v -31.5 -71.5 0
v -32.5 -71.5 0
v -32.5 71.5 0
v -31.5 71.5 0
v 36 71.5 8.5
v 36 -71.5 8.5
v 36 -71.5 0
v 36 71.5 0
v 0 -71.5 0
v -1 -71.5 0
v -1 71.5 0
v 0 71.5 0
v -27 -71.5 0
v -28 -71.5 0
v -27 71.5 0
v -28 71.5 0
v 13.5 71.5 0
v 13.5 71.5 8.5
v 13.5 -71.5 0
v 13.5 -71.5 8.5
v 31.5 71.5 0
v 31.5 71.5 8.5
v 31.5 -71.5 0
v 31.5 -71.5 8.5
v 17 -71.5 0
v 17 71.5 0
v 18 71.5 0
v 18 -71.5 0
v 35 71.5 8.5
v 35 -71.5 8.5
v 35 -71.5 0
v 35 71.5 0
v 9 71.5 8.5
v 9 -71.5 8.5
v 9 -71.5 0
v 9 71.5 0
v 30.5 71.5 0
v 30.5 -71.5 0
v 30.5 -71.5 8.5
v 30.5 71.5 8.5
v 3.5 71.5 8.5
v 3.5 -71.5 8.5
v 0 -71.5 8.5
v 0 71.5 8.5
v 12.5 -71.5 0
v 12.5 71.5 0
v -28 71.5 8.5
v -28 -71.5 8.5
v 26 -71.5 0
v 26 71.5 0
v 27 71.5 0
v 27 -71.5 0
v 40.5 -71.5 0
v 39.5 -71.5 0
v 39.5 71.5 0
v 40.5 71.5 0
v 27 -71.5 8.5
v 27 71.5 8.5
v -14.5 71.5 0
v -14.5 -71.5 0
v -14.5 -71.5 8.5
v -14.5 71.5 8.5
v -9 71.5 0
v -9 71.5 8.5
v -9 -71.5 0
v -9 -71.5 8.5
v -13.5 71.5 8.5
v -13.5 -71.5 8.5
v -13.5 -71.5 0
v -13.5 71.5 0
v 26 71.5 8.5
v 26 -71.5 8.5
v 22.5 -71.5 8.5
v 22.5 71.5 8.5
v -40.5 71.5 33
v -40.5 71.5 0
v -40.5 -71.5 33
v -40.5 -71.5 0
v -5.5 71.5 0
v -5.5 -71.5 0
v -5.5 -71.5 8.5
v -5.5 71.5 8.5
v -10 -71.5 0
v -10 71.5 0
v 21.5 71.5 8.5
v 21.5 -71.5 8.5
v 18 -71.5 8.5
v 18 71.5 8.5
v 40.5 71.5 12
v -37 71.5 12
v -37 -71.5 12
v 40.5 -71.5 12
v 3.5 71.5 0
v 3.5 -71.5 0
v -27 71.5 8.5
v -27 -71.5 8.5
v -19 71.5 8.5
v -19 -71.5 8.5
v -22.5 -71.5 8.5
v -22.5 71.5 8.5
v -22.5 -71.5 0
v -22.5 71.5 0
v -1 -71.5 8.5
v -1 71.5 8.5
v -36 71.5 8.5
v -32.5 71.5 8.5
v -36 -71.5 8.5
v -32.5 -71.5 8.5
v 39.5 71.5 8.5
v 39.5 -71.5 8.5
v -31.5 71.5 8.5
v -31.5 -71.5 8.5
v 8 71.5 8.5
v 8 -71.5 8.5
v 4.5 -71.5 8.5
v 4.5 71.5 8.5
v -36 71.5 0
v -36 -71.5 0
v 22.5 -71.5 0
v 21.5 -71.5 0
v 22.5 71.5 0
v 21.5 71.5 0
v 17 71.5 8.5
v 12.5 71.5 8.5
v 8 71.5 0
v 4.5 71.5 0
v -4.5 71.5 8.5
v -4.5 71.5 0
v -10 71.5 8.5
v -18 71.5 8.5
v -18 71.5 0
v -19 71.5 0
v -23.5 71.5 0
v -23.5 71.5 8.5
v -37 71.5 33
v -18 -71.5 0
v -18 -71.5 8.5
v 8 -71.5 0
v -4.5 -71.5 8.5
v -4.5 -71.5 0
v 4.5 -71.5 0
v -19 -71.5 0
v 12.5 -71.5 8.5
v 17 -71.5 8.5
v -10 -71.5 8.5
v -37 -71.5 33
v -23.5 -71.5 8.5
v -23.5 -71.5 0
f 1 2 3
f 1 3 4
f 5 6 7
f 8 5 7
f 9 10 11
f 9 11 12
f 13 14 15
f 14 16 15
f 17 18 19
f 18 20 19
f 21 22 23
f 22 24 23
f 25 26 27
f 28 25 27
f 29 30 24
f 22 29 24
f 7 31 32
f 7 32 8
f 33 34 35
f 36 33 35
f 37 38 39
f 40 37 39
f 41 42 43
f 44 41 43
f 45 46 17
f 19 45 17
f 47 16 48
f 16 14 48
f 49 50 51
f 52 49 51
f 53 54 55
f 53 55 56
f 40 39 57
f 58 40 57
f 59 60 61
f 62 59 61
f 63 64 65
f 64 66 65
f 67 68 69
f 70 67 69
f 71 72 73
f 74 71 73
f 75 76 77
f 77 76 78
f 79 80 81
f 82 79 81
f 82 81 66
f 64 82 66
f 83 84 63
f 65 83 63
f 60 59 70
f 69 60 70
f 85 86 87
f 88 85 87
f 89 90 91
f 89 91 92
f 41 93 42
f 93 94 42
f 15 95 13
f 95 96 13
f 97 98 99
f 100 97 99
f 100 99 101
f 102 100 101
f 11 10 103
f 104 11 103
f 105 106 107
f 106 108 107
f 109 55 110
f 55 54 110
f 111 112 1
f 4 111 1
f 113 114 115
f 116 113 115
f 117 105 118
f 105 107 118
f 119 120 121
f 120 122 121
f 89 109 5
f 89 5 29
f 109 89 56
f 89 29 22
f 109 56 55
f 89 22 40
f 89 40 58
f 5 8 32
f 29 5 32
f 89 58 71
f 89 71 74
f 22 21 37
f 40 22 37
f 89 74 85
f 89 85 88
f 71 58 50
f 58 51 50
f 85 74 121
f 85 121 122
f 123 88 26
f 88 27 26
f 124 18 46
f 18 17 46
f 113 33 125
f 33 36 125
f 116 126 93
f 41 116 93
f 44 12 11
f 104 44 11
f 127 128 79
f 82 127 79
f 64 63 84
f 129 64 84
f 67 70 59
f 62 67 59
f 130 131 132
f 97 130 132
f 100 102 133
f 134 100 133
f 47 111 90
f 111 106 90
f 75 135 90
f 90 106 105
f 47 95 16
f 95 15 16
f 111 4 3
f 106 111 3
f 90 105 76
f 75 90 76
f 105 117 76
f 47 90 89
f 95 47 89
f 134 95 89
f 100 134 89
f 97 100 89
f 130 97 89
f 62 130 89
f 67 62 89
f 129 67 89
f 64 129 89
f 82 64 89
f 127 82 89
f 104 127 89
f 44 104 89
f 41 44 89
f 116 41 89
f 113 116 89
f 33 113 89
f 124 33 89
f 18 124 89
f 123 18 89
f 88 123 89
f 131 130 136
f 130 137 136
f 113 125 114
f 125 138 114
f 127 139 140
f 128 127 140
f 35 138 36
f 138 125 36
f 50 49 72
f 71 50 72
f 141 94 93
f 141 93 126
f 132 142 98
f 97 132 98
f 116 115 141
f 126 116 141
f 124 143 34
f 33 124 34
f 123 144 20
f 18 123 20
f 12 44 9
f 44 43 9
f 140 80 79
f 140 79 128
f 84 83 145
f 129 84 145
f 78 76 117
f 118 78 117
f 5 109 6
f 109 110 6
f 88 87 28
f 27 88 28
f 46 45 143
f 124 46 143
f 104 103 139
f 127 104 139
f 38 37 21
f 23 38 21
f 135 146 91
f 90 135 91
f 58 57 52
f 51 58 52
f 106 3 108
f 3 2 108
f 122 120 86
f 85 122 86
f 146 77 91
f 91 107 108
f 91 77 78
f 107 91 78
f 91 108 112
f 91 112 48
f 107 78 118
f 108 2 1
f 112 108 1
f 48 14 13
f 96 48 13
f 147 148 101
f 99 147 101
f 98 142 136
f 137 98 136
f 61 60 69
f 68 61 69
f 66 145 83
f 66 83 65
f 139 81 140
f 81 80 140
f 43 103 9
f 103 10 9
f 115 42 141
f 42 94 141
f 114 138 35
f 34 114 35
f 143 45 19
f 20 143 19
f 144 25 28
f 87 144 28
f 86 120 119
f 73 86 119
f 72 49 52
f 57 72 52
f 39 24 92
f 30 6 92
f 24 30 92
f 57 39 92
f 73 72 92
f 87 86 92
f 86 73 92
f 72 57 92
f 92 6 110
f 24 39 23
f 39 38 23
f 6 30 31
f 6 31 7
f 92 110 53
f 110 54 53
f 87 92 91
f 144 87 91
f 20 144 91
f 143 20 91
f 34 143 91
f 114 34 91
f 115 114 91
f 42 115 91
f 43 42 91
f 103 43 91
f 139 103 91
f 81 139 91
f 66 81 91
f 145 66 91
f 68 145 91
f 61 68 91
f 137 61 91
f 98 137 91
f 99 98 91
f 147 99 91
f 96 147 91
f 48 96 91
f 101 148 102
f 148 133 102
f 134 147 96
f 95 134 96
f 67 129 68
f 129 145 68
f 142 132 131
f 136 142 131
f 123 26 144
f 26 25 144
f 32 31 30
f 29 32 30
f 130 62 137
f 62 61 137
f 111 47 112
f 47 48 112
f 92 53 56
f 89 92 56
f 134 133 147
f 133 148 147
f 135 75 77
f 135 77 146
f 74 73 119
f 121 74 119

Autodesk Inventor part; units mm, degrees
ref_plane "YZ Plane" through (0, 0, 0) normal (1, 0, 0) x (0, 1, 0)
ref_plane "XZ Plane" through (0, 0, 0) normal (0, 1, 0) x (-1, 0, 0)
ref_plane "XY Plane" through (0, 0, 0) normal (0, 0, 1) x (1, 0, 0)
sketch "Skizze1" plane through (0, 0, 0) normal (0, 0, 1) x (1, 0, 0)
  line L0 (-40.5, -71.5) -> (40.5, -71.5)
  line L1 (40.5, -71.5) -> (40.5, 71.5)
  line L2 (40.5, 71.5) -> (-40.5, 71.5)
  line L3 (-40.5, 71.5) -> (-40.5, -71.5)
  line L4 (-40.5, -71.5) -> (40.5, 71.5) construction
  line L5 (40.5, -71.5) -> (-40.5, 71.5) construction
  point P0 (0, 0)
  dimension "d0" = 143
  dimension "d1" = 81
extrude "Grundkörper" add sketch "Skizze1" along normal blind 33
sketch "Skizze2" plane through (-40.5, -71.5, 0) normal (0, -1, 0) x (1, 0, 0)
  line L0 (0, 0) -> (0, 33) projected
  line L1 (0, 0) -> (81, 0) projected
  line L2 (0, 0) -> (81, 0) projected
  line L3 (81, 0) -> (81, 33) projected
  line L4 (0, 33) -> (81, 33) projected
  line L5 (0, 0) -> (0, 33) projected
  line L6 (81, 0) -> (81, 33) projected
  line L7 (3.5, 33) -> (3.5, 12)
  line L8 (3.5, 12) -> (81, 12)
  point P0 (40.5, 0)
  dimension "d4" = 12
  dimension "d5" = 3.5
extrude "Ausschnitt" cut sketch "Skizze2" against normal through all contours L4 L3 L8 L7
sketch "Skizze3" plane through (-40.5, -71.5, 0) normal (0, -1, 0) x (1, 0, 0)
  line L0 (0, 0) -> (81, 0) construction
  line L1 (81, 0) -> (81, 12) construction
  line L2 (81, 0) -> (0, 0) construction
  line L3 (76.5, 0) -> (80, 0)
  line L4 (80, 0) -> (80, 8.5)
  line L5 (80, 8.5) -> (76.5, 8.5)
  line L6 (76.5, 8.5) -> (76.5, 0)
  line L7 (72, 8.5) -> (72, 0)
  line L8 (72, 0) -> (75.5, 0)
  line L9 (75.5, 0) -> (75.5, 8.5)
  line L10 (75.5, 8.5) -> (72, 8.5)
  line L11 (67.5, 8.5) -> (67.5, 0)
  line L12 (67.5, 0) -> (71, 0)
  line L13 (71, 0) -> (71, 8.5)
  line L14 (71, 8.5) -> (67.5, 8.5)
  line L15 (63, 8.5) -> (63, 0)
  line L16 (63, 0) -> (66.5, 0)
  line L17 (66.5, 0) -> (66.5, 8.5)
  line L18 (66.5, 8.5) -> (63, 8.5)
  line L19 (58.5, 8.5) -> (58.5, 0)
  line L20 (58.5, 0) -> (62, 0)
  line L21 (62, 0) -> (62, 8.5)
  line L22 (62, 8.5) -> (58.5, 8.5)
  line L23 (54, 8.5) -> (54, 0)
  line L24 (54, 0) -> (57.5, 0)
  line L25 (57.5, 0) -> (57.5, 8.5)
  line L26 (57.5, 8.5) -> (54, 8.5)
  line L27 (49.5, 8.5) -> (49.5, 0)
  line L28 (49.5, 0) -> (53, 0)
  line L29 (53, 0) -> (53, 8.5)
  line L30 (53, 8.5) -> (49.5, 8.5)
  line L31 (45, 8.5) -> (45, 0)
  line L32 (45, 0) -> (48.5, 0)
  line L33 (48.5, 0) -> (48.5, 8.5)
  line L34 (48.5, 8.5) -> (45, 8.5)
  line L35 (40.5, 8.5) -> (40.5, 0)
  line L36 (40.5, 0) -> (44, 0)
  line L37 (44, 0) -> (44, 8.5)
  line L38 (44, 8.5) -> (40.5, 8.5)
  line L39 (36, 8.5) -> (36, 0)
  line L40 (36, 0) -> (39.5, 0)
  line L41 (39.5, 0) -> (39.5, 8.5)
  line L42 (39.5, 8.5) -> (36, 8.5)
  line L43 (31.5, 8.5) -> (31.5, 0)
  line L44 (31.5, 0) -> (35, 0)
  line L45 (35, 0) -> (35, 8.5)
  line L46 (35, 8.5) -> (31.5, 8.5)
  line L47 (27, 8.5) -> (27, 0)
  line L48 (27, 0) -> (30.5, 0)
  line L49 (30.5, 0) -> (30.5, 8.5)
  line L50 (30.5, 8.5) -> (27, 8.5)
  line L51 (22.5, 8.5) -> (22.5, 0)
  line L52 (22.5, 0) -> (26, 0)
  line L53 (26, 0) -> (26, 8.5)
  line L54 (26, 8.5) -> (22.5, 8.5)
  line L55 (18, 8.5) -> (18, 0)
  line L56 (18, 0) -> (21.5, 0)
  line L57 (21.5, 0) -> (21.5, 8.5)
  line L58 (21.5, 8.5) -> (18, 8.5)
  line L59 (13.5, 8.5) -> (13.5, 0)
  line L60 (13.5, 0) -> (17, 0)
  line L61 (17, 0) -> (17, 8.5)
  line L62 (17, 8.5) -> (13.5, 8.5)
  line L63 (9, 8.5) -> (9, 0)
  line L64 (9, 0) -> (12.5, 0)
  line L65 (12.5, 0) -> (12.5, 8.5)
  line L66 (12.5, 8.5) -> (9, 8.5)
  line L67 (4.5, 8.5) -> (4.5, 0)
  line L68 (4.5, 0) -> (8, 0)
  line L69 (8, 0) -> (8, 8.5)
  line L70 (8, 8.5) -> (4.5, 8.5)
  point P0 (40.5, 0)
  dimension "d11" = 1
  dimension "d12" = 8.5
  dimension "d13" = 3.5
  dimension "d16" = 4.5
extrude "Kühlrippen" cut sketch "Skizze3" against normal through all
properties part number "800-20-MOTOR-CONTROLLER-BLD-300B-01" material "Aluminium 6061"
